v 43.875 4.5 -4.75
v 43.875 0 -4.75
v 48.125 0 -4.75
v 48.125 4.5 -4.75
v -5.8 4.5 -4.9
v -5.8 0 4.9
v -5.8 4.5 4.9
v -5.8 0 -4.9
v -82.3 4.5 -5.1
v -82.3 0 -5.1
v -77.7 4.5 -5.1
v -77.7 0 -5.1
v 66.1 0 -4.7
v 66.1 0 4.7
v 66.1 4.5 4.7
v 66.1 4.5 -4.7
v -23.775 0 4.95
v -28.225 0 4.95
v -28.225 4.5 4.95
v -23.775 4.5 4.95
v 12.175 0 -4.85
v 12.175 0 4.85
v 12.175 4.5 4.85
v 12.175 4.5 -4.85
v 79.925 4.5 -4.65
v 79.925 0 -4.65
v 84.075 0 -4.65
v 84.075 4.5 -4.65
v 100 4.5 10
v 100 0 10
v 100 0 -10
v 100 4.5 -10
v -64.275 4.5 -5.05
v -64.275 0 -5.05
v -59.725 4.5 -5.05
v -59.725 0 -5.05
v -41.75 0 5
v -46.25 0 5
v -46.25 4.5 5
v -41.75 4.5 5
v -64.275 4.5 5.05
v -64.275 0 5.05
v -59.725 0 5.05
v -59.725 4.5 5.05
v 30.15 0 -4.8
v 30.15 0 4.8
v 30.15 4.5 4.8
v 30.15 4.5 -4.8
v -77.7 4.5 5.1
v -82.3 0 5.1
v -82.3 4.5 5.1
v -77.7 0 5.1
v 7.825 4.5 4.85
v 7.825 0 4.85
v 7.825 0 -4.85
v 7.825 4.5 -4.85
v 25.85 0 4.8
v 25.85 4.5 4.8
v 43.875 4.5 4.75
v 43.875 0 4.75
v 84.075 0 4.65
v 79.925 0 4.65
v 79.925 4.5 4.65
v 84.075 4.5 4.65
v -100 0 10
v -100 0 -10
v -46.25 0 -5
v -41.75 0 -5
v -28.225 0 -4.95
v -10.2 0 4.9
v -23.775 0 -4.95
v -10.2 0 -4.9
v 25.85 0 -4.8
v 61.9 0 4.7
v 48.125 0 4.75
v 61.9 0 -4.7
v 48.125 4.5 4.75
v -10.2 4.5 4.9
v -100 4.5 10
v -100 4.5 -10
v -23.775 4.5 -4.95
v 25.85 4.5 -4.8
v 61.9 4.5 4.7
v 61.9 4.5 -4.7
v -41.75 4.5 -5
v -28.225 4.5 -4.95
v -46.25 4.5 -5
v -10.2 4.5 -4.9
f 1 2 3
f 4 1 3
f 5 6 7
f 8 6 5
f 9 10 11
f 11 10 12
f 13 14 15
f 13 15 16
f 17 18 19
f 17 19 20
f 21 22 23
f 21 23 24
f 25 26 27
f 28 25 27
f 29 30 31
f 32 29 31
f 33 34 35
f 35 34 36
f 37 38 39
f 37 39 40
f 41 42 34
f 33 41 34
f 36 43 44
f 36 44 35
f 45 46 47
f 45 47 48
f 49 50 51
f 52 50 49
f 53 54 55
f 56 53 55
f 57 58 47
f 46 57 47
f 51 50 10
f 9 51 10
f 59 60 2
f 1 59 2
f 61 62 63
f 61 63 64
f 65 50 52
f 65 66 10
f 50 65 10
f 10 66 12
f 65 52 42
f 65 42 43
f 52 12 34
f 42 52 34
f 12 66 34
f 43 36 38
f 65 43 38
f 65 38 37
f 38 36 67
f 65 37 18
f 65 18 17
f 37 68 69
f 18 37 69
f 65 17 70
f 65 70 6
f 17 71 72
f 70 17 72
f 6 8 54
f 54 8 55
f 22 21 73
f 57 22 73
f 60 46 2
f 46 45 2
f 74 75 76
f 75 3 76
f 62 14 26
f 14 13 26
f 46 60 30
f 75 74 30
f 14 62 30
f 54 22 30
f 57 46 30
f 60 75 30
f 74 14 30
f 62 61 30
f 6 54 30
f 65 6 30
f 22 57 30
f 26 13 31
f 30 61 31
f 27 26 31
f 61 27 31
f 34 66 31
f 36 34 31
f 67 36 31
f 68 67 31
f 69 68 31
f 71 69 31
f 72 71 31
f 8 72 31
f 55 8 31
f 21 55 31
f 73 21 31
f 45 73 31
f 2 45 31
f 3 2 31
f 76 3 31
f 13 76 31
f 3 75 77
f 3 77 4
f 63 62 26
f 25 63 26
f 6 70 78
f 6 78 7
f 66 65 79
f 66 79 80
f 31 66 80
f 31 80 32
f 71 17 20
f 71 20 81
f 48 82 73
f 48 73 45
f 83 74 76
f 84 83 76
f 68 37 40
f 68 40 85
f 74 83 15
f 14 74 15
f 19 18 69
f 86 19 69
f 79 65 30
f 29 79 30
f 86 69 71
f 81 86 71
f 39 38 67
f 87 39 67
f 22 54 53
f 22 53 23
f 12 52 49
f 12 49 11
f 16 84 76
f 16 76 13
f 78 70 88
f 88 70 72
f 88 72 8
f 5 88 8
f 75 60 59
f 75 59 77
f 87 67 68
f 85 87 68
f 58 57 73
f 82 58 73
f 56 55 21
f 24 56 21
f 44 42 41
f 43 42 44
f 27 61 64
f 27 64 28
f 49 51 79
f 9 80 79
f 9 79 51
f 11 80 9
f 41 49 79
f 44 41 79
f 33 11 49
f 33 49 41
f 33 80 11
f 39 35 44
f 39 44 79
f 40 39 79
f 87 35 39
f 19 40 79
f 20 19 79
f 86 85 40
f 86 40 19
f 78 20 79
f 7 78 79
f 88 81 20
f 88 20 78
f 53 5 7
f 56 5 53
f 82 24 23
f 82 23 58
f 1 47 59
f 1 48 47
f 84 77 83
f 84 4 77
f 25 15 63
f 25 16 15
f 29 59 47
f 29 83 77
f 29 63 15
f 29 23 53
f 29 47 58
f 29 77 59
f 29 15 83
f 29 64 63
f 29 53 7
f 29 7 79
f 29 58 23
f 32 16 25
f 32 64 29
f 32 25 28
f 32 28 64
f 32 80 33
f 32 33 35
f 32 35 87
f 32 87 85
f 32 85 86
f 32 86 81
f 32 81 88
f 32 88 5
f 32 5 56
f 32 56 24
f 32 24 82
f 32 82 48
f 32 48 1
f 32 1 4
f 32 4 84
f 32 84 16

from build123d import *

# Parameters (mm, degrees)
SKETCH1_W           = 200
SKETCH1_H           = 20
SKETCH1_W_2         = 4.6
SKETCH1_H_2         = 10.2
SKETCH1_W_3         = 4.55
SKETCH1_H_3         = 10.1
SKETCH1_W_4         = 4.5
SKETCH1_H_4         = 10
SKETCH1_W_5         = 4.45
SKETCH1_H_5         = 9.9
SKETCH1_W_6         = 4.4
SKETCH1_H_6         = 9.8
SKETCH1_W_7         = 4.35
SKETCH1_H_7         = 9.7
SKETCH1_W_8         = 4.3
SKETCH1_H_8         = 9.6
SKETCH1_W_9         = 4.25
SKETCH1_H_9         = 9.5
SKETCH1_W_10        = 4.2
SKETCH1_H_10        = 9.4
SKETCH1_W_11        = 4.15
SKETCH1_H_11        = 9.3
BOSS_EXTRUDE1_DEPTH = 4.5


with BuildPart() as part:
    # Sketch1 → Boss-Extrude1 (new body)
    with BuildSketch(Plane(origin=(0, 0, 0), x_dir=(1, 0, 0), z_dir=(0, 1, 0))):
        Rectangle(SKETCH1_W, SKETCH1_H)
        with Locations((-80, 0)):
            Rectangle(SKETCH1_W_2, SKETCH1_H_2, mode=Mode.SUBTRACT)
        with Locations((-62, 0)):
            Rectangle(SKETCH1_W_3, SKETCH1_H_3, mode=Mode.SUBTRACT)
        with Locations((-44, 0)):
            Rectangle(SKETCH1_W_4, SKETCH1_H_4, mode=Mode.SUBTRACT)
        with Locations((-26, 0)):
            Rectangle(SKETCH1_W_5, SKETCH1_H_5, mode=Mode.SUBTRACT)
        with Locations((-8, 0)):
            Rectangle(SKETCH1_W_6, SKETCH1_H_6, mode=Mode.SUBTRACT)
        with Locations((10, 0)):
            Rectangle(SKETCH1_W_7, SKETCH1_H_7, mode=Mode.SUBTRACT)
        with Locations((28, 0)):
            Rectangle(SKETCH1_W_8, SKETCH1_H_8, mode=Mode.SUBTRACT)
        with Locations((46, 0)):
            Rectangle(SKETCH1_W_9, SKETCH1_H_9, mode=Mode.SUBTRACT)
        with Locations((64, 0)):
            Rectangle(SKETCH1_W_10, SKETCH1_H_10, mode=Mode.SUBTRACT)
        with Locations((82, 0)):
            Rectangle(SKETCH1_W_11, SKETCH1_H_11, mode=Mode.SUBTRACT)
    extrude(amount=BOSS_EXTRUDE1_DEPTH)


solid = part.part
